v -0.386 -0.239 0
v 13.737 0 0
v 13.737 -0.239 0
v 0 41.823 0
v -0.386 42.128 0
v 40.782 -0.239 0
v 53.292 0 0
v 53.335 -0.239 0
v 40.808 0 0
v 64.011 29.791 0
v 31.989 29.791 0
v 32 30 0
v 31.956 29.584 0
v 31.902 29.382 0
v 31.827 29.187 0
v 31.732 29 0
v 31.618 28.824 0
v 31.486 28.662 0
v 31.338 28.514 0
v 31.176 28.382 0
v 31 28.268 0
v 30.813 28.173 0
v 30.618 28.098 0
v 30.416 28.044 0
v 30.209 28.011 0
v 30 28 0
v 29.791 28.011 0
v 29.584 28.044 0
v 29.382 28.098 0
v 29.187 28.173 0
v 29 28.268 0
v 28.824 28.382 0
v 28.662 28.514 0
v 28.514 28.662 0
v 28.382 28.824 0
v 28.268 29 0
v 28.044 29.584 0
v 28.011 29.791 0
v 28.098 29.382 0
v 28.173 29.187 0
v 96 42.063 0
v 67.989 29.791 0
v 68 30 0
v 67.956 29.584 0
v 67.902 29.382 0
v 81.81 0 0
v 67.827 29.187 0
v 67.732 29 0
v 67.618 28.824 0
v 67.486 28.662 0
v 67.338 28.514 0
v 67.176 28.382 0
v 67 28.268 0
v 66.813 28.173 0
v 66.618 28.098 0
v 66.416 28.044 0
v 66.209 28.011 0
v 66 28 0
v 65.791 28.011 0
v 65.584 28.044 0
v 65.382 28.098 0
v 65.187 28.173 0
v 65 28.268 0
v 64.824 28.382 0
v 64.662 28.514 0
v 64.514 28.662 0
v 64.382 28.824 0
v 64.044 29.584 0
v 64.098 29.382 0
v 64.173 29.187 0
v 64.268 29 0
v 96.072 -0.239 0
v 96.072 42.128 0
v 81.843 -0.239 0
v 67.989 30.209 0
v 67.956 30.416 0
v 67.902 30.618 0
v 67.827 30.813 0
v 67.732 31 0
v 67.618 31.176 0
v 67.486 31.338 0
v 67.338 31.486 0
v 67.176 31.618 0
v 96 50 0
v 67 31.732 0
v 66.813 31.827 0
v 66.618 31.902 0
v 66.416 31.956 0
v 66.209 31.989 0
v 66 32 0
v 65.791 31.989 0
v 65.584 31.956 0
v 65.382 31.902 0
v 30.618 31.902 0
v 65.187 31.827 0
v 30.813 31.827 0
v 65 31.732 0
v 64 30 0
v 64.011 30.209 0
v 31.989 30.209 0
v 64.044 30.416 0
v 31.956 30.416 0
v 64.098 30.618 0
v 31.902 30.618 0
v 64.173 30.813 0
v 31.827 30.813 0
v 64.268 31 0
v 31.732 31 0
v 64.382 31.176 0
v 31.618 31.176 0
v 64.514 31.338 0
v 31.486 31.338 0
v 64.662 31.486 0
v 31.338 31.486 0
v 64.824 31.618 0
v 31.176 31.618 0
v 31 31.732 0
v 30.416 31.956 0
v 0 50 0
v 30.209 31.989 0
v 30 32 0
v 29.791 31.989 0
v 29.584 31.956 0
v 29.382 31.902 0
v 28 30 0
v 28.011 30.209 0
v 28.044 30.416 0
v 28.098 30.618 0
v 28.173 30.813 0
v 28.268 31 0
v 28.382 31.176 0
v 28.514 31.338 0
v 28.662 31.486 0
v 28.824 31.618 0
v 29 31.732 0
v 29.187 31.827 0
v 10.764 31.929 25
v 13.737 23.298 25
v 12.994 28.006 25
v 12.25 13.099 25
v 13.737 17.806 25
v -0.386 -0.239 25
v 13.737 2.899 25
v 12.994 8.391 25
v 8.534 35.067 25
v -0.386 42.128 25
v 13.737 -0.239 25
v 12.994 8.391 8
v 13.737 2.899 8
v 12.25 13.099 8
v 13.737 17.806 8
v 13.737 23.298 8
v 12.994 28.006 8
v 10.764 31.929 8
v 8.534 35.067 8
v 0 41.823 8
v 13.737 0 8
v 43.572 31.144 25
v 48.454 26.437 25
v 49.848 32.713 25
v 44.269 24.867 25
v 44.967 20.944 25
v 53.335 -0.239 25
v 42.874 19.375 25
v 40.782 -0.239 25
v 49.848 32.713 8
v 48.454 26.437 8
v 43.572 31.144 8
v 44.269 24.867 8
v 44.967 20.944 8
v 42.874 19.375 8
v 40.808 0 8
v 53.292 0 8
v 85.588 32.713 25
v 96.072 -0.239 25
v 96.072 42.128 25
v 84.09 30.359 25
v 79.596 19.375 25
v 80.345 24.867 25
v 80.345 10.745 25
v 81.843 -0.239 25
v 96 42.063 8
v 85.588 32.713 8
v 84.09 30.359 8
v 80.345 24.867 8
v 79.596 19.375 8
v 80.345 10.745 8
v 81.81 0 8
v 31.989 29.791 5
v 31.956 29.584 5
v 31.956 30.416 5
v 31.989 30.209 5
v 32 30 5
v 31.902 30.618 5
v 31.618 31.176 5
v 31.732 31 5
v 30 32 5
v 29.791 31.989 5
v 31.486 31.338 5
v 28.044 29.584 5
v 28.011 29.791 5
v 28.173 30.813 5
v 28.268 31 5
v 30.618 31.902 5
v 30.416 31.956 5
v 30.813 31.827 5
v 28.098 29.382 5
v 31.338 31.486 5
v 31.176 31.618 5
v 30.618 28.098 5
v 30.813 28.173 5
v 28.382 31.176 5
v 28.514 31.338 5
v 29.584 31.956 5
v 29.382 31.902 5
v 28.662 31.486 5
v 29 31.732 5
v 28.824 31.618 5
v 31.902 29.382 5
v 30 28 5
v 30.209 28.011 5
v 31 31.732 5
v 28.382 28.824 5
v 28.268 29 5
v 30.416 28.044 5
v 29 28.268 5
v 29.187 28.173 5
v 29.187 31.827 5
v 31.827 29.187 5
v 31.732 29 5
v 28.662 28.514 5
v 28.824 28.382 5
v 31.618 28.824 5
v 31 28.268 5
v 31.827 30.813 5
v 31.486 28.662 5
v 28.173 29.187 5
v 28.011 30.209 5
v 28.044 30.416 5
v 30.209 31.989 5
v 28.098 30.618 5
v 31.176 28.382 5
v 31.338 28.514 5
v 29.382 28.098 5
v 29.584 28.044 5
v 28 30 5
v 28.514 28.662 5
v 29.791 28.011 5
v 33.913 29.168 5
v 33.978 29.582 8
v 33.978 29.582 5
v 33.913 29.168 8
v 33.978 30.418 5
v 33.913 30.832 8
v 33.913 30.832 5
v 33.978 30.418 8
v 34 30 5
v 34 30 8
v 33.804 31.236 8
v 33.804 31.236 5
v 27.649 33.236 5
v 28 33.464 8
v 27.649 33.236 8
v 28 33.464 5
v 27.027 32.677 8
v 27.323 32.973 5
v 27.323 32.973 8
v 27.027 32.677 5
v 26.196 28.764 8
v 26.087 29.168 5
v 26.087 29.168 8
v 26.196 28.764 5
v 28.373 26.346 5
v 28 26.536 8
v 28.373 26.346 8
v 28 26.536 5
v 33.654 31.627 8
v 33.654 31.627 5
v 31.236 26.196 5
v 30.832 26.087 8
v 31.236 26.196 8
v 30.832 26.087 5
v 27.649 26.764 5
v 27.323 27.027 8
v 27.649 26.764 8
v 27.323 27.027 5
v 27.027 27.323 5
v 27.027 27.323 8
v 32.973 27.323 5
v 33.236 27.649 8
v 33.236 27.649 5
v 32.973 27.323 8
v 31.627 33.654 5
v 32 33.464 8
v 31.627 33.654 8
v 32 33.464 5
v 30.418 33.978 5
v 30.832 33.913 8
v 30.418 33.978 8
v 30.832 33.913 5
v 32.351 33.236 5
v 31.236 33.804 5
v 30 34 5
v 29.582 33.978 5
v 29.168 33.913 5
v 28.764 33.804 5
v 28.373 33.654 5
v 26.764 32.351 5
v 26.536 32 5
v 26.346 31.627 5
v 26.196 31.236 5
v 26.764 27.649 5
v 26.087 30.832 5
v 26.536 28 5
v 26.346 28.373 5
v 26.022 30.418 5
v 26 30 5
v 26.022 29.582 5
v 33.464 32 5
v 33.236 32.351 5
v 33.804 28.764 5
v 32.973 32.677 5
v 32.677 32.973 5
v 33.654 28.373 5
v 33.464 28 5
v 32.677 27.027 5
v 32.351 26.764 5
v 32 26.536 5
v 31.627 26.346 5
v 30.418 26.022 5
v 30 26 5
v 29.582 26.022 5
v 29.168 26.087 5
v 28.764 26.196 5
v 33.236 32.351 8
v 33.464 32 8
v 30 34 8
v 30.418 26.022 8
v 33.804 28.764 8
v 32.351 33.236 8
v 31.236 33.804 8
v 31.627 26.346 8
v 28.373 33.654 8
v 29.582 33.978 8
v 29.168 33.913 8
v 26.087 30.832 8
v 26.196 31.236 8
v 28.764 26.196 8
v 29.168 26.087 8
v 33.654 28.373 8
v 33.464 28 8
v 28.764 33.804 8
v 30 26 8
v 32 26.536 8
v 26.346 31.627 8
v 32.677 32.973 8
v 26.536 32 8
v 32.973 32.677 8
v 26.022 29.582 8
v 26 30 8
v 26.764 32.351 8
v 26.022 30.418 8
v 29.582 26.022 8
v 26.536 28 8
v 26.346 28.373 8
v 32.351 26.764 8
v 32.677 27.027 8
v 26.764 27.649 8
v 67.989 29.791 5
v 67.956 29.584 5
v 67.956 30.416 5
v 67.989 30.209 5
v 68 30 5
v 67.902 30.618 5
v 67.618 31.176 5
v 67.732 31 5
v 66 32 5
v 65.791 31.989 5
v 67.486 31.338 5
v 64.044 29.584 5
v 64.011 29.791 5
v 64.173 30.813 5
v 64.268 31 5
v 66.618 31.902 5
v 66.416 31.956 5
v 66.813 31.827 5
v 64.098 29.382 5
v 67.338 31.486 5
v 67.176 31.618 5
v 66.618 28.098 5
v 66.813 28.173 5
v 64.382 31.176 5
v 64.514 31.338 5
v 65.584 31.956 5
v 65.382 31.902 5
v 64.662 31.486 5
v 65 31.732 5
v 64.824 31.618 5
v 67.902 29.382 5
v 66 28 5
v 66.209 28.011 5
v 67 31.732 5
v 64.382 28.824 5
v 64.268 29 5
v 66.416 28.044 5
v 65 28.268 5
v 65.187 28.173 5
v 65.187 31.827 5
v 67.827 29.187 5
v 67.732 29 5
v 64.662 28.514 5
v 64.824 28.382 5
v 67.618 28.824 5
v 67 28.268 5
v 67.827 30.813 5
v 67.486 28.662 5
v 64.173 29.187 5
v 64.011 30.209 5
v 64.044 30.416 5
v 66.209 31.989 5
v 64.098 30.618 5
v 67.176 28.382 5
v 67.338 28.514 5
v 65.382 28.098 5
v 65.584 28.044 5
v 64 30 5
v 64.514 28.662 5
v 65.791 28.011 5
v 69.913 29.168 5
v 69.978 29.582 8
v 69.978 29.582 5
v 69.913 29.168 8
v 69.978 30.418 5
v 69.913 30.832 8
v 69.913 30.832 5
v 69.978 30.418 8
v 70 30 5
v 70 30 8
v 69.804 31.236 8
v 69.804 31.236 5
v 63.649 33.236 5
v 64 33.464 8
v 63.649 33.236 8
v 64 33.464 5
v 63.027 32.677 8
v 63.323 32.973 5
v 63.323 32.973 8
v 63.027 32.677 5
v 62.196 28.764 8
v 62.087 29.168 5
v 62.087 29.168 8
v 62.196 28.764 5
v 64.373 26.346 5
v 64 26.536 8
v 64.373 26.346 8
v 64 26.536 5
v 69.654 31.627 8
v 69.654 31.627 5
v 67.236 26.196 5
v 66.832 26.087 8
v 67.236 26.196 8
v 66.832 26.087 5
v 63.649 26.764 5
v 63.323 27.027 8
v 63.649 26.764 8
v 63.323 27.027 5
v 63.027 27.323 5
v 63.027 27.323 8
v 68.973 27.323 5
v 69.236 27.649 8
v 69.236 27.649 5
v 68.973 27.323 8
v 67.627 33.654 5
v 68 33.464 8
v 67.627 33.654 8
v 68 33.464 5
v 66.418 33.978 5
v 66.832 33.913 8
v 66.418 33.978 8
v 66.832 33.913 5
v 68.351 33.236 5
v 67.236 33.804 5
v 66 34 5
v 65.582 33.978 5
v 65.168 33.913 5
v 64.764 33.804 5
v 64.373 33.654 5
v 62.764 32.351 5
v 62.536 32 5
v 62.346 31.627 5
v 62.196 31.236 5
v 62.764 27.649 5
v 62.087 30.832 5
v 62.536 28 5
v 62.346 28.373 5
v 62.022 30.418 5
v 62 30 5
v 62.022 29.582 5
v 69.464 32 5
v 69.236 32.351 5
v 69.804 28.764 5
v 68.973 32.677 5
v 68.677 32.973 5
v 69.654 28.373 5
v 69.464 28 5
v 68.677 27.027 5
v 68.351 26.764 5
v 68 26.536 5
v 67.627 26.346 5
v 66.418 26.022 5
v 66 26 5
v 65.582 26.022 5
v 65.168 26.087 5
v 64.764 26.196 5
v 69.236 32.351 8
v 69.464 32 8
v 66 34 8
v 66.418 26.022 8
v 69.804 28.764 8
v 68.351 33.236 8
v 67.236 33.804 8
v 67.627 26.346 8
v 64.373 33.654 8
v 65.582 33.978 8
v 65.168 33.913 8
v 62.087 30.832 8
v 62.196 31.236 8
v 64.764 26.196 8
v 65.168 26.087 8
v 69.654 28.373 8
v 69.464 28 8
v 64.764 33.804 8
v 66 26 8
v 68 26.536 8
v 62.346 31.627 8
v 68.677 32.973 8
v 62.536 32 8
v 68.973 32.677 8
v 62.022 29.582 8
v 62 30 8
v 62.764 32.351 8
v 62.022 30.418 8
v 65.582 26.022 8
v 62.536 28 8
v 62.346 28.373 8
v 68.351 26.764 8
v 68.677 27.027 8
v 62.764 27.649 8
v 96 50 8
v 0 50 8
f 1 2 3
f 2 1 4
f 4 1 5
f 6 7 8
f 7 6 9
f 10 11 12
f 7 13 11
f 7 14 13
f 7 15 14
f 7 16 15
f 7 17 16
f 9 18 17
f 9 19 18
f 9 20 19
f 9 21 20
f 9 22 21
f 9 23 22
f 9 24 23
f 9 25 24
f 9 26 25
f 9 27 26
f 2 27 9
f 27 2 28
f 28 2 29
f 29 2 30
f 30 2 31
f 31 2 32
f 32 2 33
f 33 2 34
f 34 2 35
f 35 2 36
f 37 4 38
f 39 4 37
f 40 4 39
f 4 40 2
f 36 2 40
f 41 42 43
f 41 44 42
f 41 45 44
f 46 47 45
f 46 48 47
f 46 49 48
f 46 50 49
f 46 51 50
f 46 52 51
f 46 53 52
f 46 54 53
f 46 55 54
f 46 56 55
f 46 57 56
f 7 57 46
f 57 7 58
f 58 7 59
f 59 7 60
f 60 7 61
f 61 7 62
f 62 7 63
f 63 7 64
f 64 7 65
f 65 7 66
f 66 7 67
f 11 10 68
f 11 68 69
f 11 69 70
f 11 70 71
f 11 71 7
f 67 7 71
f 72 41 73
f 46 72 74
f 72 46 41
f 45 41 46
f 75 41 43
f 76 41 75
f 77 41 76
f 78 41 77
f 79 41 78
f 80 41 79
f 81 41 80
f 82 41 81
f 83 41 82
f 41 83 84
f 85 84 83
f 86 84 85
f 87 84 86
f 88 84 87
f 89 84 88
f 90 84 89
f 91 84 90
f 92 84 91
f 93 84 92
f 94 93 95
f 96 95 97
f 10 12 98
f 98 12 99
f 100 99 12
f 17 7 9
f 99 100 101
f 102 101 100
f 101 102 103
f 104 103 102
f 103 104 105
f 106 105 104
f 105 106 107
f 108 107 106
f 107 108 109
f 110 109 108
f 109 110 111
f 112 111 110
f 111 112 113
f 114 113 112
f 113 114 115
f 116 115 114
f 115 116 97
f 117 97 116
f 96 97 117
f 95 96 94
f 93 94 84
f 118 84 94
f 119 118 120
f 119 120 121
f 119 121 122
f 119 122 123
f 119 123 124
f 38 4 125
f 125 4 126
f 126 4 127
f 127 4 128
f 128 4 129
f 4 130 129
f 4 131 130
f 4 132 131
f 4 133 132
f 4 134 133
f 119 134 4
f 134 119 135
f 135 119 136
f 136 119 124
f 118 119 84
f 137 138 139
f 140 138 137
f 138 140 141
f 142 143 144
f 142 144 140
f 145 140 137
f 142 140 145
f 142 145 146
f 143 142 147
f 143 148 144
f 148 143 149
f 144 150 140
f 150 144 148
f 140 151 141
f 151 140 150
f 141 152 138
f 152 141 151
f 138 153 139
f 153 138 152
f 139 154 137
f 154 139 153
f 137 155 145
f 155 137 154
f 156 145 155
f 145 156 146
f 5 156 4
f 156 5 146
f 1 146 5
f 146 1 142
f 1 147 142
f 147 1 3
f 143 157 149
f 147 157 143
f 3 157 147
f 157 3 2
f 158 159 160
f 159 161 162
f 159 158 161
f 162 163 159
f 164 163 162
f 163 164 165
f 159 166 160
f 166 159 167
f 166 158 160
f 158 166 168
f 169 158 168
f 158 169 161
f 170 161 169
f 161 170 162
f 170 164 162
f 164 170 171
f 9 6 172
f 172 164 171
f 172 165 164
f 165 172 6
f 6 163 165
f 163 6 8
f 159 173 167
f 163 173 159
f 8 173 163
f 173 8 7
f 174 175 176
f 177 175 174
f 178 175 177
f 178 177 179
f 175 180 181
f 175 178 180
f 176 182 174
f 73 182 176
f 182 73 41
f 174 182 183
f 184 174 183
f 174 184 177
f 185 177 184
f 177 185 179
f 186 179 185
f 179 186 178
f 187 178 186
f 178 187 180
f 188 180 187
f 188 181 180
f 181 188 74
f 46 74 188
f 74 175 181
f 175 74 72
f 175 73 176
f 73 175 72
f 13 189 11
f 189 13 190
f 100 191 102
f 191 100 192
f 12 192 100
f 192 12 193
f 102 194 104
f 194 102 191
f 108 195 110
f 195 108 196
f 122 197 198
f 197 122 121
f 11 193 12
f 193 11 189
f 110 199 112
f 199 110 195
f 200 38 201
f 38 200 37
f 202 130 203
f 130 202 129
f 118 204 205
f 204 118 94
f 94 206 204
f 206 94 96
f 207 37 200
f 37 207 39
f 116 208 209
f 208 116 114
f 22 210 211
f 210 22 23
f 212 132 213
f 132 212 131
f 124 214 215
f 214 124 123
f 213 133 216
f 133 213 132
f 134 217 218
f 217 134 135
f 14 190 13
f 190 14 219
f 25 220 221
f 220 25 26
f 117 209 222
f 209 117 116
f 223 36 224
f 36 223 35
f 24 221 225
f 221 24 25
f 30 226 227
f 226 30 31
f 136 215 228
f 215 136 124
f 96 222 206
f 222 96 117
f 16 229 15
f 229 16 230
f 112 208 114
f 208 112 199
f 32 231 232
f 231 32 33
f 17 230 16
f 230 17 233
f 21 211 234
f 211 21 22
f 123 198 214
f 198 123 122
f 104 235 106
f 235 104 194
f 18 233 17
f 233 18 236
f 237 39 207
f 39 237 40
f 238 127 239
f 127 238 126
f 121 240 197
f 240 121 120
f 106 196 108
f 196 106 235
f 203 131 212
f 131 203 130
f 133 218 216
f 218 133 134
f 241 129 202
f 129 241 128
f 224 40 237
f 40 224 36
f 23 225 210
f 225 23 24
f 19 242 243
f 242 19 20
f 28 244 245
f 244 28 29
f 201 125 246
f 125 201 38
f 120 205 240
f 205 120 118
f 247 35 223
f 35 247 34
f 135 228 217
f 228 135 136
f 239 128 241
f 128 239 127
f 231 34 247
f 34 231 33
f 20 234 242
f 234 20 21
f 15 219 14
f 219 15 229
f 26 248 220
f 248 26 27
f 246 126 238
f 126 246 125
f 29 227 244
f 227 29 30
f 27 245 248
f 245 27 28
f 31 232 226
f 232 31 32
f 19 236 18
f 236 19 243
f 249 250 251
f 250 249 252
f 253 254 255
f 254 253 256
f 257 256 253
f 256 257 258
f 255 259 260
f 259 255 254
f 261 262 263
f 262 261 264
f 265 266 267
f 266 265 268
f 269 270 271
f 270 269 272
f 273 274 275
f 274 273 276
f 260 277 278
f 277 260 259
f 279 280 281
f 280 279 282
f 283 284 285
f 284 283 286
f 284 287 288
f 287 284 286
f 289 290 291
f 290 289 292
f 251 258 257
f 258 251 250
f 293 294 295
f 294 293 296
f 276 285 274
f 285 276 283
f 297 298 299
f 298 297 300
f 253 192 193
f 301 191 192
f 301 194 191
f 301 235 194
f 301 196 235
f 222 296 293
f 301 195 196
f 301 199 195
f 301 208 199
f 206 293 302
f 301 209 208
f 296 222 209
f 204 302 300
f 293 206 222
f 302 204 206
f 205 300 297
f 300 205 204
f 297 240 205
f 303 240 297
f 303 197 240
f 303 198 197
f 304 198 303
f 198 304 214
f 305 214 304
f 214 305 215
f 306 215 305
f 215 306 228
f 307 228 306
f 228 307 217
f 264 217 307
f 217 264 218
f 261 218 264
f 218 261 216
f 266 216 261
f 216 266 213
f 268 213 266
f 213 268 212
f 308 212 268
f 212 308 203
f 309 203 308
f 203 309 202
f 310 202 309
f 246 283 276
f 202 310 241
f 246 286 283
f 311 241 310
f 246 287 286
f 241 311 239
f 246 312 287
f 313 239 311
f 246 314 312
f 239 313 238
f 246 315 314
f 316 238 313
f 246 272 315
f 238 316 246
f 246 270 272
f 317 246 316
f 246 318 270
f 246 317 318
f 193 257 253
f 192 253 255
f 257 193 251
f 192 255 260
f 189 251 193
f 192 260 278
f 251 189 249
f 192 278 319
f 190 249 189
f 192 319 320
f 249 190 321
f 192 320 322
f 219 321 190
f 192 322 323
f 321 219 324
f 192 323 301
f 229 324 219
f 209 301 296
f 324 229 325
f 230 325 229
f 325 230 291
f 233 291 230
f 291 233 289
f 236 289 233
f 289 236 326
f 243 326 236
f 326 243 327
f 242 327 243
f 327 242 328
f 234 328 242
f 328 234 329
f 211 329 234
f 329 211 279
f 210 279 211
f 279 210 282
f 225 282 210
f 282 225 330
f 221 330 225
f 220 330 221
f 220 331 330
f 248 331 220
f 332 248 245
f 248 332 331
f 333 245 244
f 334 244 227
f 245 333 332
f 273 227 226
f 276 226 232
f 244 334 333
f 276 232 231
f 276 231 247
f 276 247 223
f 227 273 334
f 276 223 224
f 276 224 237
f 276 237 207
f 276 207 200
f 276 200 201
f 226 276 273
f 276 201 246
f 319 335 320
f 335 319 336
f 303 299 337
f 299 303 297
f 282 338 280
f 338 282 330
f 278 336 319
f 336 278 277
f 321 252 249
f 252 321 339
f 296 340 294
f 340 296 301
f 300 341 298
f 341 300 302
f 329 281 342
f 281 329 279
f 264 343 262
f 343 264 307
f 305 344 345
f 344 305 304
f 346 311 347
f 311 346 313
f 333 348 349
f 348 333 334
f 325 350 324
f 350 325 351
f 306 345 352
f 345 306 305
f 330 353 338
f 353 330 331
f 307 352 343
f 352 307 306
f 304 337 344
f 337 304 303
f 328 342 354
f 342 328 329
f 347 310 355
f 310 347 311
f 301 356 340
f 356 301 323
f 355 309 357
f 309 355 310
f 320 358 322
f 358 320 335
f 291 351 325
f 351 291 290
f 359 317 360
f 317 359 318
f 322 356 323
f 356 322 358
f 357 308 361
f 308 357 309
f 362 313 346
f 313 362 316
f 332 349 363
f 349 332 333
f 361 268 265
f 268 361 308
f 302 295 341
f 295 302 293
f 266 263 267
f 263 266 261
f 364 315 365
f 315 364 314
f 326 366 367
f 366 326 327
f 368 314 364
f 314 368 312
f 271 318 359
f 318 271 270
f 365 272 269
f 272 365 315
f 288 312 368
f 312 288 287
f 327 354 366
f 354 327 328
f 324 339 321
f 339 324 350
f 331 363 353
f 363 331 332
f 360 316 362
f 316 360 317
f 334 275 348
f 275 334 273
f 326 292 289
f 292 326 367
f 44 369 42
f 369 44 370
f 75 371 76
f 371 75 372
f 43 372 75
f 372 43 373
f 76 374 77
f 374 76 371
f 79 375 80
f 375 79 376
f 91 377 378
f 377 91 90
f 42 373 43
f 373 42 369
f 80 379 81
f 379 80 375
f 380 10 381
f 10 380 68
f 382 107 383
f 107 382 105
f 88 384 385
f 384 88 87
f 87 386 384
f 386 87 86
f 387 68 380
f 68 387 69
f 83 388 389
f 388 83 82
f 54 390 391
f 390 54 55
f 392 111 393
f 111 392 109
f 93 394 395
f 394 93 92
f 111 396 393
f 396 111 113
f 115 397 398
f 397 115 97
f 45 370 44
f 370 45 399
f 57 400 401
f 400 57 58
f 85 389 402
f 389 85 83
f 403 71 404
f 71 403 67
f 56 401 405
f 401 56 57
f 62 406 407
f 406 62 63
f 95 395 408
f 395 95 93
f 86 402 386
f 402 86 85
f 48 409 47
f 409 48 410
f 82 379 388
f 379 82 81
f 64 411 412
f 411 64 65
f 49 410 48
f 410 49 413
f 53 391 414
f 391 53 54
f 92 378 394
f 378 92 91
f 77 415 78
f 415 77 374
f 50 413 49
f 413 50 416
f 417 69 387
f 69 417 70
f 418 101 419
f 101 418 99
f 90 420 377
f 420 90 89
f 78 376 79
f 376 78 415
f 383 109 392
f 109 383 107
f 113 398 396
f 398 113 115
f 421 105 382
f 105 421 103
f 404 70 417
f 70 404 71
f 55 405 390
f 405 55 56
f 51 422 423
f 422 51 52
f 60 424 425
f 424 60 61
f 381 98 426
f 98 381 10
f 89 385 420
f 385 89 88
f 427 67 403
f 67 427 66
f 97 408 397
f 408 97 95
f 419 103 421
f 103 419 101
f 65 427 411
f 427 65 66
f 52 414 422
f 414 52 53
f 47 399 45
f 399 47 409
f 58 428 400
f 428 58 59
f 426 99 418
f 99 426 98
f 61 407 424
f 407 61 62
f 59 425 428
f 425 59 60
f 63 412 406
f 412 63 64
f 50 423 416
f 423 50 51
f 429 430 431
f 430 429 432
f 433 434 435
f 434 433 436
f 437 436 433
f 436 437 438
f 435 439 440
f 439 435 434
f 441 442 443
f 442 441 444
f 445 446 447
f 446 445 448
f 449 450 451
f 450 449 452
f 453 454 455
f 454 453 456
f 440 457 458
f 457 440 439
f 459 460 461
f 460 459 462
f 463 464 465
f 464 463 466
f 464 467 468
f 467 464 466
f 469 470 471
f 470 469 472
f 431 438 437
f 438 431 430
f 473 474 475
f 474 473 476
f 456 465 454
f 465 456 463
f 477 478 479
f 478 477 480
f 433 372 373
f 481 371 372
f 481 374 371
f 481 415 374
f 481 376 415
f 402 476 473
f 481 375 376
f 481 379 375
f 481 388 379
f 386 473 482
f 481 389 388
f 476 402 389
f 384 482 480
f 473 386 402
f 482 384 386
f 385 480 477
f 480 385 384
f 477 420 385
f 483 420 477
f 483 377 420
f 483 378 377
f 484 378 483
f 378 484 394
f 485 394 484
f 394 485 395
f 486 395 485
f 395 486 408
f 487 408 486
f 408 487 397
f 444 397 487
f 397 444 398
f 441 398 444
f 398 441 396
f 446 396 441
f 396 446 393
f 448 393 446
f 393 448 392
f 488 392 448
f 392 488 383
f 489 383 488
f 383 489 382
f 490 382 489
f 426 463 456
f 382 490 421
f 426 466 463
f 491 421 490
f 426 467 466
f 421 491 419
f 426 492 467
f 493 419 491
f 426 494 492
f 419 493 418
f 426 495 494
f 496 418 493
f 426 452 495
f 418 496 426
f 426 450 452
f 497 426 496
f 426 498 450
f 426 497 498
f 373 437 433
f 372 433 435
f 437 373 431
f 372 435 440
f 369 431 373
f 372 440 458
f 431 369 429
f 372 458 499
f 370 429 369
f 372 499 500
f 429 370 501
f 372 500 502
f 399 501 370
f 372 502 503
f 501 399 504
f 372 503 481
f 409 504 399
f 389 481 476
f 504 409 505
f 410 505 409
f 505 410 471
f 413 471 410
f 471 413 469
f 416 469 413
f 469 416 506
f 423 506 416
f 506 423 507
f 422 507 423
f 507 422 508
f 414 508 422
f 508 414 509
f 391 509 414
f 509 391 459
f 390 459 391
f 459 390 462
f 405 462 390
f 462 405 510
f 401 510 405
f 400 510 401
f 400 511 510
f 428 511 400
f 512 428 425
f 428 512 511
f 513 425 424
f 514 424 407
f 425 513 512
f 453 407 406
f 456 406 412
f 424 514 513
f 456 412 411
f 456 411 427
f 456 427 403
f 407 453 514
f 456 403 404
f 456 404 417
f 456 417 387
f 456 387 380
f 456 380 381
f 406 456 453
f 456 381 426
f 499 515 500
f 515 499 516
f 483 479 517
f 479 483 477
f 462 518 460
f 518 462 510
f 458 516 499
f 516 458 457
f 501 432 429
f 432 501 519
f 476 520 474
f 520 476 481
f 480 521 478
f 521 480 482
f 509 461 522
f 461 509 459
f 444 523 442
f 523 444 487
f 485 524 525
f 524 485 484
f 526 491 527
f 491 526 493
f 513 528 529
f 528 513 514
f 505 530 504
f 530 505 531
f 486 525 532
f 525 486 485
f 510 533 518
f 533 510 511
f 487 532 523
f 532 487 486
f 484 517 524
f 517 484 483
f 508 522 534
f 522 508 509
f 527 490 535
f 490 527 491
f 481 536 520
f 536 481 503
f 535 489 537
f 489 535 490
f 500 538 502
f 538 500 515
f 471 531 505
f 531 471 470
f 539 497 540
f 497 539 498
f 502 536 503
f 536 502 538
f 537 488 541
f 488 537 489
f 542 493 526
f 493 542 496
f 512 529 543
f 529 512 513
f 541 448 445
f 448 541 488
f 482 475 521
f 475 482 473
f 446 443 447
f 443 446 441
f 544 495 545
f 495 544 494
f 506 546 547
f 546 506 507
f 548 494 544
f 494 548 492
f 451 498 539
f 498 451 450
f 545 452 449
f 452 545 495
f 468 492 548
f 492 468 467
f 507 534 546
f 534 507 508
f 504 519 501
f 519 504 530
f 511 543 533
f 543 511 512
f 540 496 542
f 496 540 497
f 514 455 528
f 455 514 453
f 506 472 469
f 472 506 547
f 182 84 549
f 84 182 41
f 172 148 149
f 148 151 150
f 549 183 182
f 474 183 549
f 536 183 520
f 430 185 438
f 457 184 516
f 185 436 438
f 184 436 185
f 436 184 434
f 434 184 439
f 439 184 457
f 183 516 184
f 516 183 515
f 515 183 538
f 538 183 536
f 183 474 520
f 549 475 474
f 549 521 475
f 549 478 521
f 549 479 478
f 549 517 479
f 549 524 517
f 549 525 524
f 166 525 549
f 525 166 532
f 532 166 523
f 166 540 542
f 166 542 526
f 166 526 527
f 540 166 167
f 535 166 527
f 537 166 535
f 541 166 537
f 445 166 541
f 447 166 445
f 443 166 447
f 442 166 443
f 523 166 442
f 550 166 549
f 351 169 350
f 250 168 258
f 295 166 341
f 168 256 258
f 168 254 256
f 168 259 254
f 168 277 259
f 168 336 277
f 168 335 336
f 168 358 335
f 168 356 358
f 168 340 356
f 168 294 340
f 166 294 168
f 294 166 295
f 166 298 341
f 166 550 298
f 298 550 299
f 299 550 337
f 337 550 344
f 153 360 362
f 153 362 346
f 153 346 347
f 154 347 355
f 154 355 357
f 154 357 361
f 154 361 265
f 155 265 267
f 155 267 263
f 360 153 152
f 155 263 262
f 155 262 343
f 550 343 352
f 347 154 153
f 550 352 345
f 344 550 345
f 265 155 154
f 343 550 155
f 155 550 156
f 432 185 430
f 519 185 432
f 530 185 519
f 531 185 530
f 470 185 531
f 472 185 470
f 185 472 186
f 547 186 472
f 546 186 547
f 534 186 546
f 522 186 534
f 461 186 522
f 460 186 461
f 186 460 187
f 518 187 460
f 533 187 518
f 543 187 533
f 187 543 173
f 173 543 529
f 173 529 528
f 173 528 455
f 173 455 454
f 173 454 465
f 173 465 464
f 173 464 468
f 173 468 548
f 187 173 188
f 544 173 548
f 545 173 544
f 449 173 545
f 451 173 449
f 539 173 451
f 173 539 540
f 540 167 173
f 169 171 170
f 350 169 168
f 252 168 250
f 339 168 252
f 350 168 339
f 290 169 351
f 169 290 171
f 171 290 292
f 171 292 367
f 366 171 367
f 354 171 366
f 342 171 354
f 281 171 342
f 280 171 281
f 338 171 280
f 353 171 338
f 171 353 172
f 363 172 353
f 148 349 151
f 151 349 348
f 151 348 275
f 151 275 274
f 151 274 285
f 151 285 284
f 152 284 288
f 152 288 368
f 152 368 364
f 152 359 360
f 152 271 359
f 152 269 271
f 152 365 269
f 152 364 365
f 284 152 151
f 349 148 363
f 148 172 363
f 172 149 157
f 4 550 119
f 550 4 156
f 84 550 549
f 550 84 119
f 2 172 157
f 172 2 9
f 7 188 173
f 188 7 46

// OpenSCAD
// Crimper-Halterung


module Loch() {
    $fn=60;
    translate([0,0,-5])
    cylinder(d=4,h=20);
    translate([0,0,5])
    cylinder(d=8,h=3.5);
}

module Dupont(){
    translate([-20,-47,0])
    linear_extrude(height = 25) {
            scale(0.139)
            import("Crimper-Dupont.dxf");
    } 
}

module Dupontleft() {
    difference() {
        Dupont();
        translate([20,-5,-50])
        cube([100,100,100]);
    }
}

module Dupontmiddle() {
    difference() {
        Dupont();
        translate([-80,-5,-50])
        cube([100,100,100]);
        translate([50,-5,-50])
        cube([100,100,100]);
    }
}

module Dupontright() {
    difference() {
        Dupont();
        translate([-50,-5,-50])
        cube([100,100,100]);
    }
}



Dupontleft();
translate([9,0,0])
Dupontmiddle();
translate([18,0,0])
Dupontright();


difference() {
    cube([96,50,8]);
    translate([30,30,0])
    Loch();
    translate([96-30,30,0])
    Loch();
}
